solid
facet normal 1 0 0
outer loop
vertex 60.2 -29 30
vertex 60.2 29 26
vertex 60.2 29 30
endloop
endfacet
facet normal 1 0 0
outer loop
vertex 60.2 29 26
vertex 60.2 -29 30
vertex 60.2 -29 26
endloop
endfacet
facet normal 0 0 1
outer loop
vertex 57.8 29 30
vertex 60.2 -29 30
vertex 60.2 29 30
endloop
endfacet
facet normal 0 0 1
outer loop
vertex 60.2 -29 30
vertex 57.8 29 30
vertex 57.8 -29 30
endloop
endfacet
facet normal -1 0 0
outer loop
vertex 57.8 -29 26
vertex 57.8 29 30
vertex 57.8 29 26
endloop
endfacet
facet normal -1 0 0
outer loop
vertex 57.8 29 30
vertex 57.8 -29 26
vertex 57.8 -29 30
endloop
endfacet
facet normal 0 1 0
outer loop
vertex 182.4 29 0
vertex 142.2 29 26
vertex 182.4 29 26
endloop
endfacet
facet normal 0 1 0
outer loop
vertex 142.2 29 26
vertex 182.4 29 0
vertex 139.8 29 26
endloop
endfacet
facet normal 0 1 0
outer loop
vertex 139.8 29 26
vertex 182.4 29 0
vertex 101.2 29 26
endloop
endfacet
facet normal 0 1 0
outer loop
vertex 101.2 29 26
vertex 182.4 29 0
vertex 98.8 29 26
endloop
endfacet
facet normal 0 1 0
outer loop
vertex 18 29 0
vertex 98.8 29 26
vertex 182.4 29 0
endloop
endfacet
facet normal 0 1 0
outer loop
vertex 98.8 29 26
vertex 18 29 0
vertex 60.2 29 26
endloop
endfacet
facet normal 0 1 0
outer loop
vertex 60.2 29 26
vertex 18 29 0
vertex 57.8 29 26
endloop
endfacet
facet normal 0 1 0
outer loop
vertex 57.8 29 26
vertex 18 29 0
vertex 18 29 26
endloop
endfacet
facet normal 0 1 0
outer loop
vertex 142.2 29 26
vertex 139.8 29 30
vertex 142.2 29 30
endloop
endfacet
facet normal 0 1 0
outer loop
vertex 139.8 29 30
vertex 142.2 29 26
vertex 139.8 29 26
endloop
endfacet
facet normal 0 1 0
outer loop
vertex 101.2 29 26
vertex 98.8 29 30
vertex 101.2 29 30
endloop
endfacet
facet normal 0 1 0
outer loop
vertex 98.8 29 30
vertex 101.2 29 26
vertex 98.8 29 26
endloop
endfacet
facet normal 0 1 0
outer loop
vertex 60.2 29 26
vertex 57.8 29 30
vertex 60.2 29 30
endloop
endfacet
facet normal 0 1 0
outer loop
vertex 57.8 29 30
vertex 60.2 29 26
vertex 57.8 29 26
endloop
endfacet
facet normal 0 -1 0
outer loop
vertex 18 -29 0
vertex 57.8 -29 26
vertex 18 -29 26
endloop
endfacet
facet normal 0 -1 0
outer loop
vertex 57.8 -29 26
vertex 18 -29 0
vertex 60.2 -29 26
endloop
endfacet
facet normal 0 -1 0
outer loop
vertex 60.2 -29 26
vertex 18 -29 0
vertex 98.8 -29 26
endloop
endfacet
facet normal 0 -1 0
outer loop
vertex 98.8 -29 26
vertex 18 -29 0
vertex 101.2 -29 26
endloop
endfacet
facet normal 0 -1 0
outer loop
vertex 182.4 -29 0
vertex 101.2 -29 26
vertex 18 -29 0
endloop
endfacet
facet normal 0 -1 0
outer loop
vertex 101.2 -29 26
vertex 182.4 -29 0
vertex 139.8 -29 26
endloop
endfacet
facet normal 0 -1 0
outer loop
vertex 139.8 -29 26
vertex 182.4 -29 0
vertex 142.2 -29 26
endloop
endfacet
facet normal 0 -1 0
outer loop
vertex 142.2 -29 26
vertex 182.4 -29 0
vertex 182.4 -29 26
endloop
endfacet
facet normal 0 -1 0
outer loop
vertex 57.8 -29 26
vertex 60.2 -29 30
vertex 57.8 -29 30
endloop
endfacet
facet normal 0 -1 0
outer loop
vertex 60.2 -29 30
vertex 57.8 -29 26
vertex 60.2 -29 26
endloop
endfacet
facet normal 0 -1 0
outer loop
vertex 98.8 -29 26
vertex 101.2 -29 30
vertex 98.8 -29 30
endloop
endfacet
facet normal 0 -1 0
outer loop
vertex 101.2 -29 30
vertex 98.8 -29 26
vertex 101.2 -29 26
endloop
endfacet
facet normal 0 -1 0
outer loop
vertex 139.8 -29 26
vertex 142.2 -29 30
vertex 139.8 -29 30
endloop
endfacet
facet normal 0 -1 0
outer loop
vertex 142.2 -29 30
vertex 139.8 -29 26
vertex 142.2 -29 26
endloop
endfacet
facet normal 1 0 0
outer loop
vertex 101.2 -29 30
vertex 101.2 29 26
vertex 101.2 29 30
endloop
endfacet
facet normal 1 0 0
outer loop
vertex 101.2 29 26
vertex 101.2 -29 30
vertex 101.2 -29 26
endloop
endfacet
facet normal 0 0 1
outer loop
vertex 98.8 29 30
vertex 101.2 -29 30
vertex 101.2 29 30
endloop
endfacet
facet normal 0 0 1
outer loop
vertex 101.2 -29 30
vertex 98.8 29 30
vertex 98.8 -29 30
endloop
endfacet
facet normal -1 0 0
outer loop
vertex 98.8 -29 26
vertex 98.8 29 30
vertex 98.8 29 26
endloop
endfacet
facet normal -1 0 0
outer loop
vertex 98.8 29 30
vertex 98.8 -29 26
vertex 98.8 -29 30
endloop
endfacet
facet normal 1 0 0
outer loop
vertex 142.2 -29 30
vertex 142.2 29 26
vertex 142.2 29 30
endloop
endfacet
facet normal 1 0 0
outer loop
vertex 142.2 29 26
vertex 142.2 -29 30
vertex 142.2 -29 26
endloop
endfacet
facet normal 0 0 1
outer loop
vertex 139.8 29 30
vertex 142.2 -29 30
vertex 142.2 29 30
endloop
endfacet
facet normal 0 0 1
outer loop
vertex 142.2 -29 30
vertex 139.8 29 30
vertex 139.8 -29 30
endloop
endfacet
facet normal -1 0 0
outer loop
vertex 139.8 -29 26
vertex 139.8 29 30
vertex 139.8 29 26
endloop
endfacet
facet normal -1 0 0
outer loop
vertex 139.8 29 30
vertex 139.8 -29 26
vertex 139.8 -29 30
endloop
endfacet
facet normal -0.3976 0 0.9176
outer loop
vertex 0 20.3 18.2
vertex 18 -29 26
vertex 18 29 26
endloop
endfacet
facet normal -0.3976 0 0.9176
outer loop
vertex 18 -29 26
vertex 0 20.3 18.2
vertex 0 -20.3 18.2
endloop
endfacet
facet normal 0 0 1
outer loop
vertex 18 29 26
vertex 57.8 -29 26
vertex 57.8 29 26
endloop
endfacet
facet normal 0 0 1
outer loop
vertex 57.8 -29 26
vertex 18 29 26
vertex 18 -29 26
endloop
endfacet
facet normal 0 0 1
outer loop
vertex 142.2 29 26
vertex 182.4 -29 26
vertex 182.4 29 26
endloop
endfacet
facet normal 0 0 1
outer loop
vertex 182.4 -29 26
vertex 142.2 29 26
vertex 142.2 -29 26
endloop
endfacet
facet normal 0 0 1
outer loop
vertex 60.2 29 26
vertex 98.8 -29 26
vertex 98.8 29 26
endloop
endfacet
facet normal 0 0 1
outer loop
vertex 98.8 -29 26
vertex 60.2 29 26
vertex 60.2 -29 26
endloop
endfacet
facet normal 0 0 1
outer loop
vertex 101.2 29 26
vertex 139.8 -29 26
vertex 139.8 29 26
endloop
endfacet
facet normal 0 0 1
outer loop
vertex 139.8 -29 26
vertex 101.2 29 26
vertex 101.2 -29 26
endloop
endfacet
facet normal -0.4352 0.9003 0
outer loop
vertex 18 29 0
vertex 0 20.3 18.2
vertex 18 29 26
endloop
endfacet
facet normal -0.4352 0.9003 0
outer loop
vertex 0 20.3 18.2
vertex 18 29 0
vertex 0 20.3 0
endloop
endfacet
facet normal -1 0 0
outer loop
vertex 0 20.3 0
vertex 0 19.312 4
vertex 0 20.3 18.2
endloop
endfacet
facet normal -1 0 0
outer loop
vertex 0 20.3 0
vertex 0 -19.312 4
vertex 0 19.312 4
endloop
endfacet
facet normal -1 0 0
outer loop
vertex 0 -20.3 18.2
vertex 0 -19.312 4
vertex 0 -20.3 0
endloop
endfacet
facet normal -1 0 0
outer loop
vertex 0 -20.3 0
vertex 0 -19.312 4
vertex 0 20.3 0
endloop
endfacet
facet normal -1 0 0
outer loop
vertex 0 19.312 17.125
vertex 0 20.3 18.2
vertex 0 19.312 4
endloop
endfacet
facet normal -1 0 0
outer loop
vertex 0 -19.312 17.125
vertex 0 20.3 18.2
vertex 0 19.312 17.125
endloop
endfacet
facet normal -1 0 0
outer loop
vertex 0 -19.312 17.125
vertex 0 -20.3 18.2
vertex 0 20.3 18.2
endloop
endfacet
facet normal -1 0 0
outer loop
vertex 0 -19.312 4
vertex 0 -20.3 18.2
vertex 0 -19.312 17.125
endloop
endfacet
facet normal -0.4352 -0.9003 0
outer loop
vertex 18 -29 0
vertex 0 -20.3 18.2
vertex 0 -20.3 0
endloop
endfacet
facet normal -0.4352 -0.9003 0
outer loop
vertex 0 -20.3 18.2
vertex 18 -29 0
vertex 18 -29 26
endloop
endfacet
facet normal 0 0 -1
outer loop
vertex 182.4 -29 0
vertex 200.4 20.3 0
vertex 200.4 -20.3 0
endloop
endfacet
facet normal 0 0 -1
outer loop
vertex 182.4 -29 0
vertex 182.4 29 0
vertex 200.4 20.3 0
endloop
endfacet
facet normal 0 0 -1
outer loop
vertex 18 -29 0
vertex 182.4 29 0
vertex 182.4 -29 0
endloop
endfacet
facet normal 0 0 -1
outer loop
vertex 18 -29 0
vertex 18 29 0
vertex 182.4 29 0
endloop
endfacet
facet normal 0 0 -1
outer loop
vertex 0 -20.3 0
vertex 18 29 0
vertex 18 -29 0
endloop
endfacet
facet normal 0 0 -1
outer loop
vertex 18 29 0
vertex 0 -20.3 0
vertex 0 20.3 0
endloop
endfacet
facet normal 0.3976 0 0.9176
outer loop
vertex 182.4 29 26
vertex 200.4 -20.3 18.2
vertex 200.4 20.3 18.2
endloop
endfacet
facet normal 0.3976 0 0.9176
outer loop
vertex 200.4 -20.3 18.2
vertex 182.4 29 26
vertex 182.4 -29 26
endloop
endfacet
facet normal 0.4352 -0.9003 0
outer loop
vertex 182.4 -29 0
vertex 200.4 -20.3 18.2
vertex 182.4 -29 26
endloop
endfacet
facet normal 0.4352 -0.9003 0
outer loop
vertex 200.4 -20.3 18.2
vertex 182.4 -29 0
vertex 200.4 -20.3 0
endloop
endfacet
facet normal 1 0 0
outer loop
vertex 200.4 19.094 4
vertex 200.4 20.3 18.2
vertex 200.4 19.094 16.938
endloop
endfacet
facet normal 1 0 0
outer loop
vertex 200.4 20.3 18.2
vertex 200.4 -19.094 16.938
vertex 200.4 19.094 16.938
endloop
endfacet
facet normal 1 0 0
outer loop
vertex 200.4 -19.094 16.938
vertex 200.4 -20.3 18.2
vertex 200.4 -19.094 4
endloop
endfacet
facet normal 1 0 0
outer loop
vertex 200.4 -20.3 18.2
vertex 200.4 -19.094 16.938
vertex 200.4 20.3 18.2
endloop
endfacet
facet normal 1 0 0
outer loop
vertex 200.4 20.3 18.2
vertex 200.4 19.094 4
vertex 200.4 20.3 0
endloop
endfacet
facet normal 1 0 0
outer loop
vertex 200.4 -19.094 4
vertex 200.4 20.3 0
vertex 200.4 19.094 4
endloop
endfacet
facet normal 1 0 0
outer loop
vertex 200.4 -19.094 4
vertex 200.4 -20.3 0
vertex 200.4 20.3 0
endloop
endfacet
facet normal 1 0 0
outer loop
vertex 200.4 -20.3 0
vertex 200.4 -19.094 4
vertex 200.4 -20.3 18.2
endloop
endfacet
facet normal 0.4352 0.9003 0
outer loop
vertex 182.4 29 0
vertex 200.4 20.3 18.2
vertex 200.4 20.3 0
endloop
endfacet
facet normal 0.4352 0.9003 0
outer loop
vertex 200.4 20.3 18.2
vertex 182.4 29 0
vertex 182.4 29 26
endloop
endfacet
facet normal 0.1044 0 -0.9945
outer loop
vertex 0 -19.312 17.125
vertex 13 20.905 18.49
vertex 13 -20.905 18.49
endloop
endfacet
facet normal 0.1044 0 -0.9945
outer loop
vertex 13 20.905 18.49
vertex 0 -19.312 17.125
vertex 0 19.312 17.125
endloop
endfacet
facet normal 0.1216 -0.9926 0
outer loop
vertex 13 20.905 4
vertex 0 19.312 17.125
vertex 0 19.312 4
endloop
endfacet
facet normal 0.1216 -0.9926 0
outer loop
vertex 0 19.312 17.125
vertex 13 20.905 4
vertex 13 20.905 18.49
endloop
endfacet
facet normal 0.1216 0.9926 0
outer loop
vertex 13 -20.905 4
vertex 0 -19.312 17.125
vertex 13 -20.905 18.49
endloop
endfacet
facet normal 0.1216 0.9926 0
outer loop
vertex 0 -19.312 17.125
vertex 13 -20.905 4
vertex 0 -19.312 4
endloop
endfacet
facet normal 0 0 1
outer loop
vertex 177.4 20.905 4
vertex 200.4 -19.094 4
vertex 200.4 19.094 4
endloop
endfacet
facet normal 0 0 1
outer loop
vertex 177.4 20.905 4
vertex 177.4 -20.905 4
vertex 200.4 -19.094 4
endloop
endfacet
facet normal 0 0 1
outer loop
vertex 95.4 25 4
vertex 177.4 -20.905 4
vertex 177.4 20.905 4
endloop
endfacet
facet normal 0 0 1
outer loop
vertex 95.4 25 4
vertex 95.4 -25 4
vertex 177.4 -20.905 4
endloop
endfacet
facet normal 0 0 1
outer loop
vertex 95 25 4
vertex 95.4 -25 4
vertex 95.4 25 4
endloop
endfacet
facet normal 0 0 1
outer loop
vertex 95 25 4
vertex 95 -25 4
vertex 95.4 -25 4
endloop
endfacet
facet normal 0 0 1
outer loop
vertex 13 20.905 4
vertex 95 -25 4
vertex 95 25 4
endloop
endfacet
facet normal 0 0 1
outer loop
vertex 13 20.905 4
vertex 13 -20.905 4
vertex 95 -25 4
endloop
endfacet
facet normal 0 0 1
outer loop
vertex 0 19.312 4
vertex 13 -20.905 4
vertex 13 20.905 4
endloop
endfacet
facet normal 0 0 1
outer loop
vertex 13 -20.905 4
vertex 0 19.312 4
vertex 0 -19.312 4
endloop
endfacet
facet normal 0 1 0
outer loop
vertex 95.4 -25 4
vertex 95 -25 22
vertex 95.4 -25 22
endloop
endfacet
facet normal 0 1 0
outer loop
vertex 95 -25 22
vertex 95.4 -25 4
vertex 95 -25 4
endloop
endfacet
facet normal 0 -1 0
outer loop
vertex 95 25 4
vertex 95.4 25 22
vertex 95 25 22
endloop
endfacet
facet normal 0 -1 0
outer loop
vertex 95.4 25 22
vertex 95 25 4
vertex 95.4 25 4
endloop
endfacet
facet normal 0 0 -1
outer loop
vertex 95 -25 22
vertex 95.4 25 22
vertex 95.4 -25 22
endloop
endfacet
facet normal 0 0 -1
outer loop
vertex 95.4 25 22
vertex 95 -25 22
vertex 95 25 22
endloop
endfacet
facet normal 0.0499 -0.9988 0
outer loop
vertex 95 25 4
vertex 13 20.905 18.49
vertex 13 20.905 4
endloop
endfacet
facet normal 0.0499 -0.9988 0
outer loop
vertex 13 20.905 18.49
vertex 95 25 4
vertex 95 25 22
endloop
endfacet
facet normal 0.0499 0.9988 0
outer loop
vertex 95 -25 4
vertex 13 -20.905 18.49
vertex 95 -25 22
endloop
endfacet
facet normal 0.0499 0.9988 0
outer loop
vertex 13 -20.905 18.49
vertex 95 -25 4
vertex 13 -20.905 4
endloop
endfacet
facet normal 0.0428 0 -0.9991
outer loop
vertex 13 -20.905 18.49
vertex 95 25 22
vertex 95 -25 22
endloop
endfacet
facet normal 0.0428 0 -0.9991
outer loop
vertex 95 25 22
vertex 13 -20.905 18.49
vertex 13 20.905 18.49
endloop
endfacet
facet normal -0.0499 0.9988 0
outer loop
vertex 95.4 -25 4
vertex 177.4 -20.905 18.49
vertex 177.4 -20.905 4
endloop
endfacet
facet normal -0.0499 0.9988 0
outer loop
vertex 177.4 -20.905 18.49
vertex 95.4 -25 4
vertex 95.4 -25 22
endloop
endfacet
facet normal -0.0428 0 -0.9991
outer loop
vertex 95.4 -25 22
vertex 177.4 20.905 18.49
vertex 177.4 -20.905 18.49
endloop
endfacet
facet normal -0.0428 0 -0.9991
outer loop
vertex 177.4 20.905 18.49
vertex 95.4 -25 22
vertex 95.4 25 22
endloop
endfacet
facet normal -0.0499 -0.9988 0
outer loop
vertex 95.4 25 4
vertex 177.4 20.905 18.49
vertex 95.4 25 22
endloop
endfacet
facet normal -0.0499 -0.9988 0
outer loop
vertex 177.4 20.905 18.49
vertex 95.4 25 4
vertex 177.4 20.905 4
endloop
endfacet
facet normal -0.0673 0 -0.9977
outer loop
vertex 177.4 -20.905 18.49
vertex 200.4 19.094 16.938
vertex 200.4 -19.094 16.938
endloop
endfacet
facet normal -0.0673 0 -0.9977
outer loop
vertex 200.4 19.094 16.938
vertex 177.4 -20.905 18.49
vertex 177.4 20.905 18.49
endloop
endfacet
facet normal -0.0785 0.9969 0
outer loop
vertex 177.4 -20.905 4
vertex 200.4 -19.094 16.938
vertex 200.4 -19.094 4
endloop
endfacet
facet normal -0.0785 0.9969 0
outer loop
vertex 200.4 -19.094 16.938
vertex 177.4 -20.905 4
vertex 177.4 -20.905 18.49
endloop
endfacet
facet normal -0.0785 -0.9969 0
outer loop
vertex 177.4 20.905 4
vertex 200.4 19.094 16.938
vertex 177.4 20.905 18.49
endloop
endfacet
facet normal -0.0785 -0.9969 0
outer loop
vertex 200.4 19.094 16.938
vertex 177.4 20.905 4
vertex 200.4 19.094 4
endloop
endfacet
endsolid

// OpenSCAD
$fn = 32;

// ----------------------------------------------------------------------
// Faired channel: 200 x 58 x 26 mm, 4 mm walls, faired ends
// ----------------------------------------------------------------------

// --- parameters (mm) ---
length = 200;             // channel length
width = 58;               // channel width at mid length
height = 26;              // channel height at mid length
wall = 4;                 // side wall thickness
floor_t = 4;              // floor thickness
end_w = 40.6;             // faired end width
end_h = 18.2;             // faired end height
ribs = 3;                 // stiffening ribs on the top
rib_t = 2.4;              // rib thickness
rib_h = 4;                // rib height

difference() {
  union() {
    hull() {
      translate([0, -20.3, 0]) cube([0.4, 40.6, 18.2]);
      translate([18, -29, 0]) cube([0.4, 58, 26]);
    }
    hull() {
      translate([18, -29, 0]) cube([0.4, 58, 26]);
      translate([100, -29, 0]) cube([0.4, 58, 26]);
    }
    hull() {
      translate([100, -29, 0]) cube([0.4, 58, 26]);
      translate([182, -29, 0]) cube([0.4, 58, 26]);
    }
    hull() {
      translate([182, -29, 0]) cube([0.4, 58, 26]);
      translate([200, -20.3, 0]) cube([0.4, 40.6, 18.2]);
    }
    /* stiffening ribs across the flat top, sunk 0.8 mm into it */
    for (i = [1 : ribs]) {
      translate([18 + i * (length - 2 * 18) / (ribs + 1) - rib_t / 2, -width / 2, height - 0.8]) cube([rib_t, width, rib_h + 0.8]);
    }
  }
  /* cavity, 5 mm proud of both ends so the ports are cut clean */
  hull() {
    translate([-5, -18.7, 4]) cube([0.4, 37.4, 12.6]);
    translate([13, -20.905, 4]) cube([0.4, 41.81, 14.49]);
  }
  hull() {
    translate([13, -20.905, 4]) cube([0.4, 41.81, 14.49]);
    translate([95, -25, 4]) cube([0.4, 50, 18]);
  }
  hull() {
    translate([95, -25, 4]) cube([0.4, 50, 18]);
    translate([177, -20.905, 4]) cube([0.4, 41.81, 14.49]);
  }
  hull() {
    translate([177, -20.905, 4]) cube([0.4, 41.81, 14.49]);
    translate([205, -18.7, 4]) cube([0.4, 37.4, 12.6]);
  }
}
